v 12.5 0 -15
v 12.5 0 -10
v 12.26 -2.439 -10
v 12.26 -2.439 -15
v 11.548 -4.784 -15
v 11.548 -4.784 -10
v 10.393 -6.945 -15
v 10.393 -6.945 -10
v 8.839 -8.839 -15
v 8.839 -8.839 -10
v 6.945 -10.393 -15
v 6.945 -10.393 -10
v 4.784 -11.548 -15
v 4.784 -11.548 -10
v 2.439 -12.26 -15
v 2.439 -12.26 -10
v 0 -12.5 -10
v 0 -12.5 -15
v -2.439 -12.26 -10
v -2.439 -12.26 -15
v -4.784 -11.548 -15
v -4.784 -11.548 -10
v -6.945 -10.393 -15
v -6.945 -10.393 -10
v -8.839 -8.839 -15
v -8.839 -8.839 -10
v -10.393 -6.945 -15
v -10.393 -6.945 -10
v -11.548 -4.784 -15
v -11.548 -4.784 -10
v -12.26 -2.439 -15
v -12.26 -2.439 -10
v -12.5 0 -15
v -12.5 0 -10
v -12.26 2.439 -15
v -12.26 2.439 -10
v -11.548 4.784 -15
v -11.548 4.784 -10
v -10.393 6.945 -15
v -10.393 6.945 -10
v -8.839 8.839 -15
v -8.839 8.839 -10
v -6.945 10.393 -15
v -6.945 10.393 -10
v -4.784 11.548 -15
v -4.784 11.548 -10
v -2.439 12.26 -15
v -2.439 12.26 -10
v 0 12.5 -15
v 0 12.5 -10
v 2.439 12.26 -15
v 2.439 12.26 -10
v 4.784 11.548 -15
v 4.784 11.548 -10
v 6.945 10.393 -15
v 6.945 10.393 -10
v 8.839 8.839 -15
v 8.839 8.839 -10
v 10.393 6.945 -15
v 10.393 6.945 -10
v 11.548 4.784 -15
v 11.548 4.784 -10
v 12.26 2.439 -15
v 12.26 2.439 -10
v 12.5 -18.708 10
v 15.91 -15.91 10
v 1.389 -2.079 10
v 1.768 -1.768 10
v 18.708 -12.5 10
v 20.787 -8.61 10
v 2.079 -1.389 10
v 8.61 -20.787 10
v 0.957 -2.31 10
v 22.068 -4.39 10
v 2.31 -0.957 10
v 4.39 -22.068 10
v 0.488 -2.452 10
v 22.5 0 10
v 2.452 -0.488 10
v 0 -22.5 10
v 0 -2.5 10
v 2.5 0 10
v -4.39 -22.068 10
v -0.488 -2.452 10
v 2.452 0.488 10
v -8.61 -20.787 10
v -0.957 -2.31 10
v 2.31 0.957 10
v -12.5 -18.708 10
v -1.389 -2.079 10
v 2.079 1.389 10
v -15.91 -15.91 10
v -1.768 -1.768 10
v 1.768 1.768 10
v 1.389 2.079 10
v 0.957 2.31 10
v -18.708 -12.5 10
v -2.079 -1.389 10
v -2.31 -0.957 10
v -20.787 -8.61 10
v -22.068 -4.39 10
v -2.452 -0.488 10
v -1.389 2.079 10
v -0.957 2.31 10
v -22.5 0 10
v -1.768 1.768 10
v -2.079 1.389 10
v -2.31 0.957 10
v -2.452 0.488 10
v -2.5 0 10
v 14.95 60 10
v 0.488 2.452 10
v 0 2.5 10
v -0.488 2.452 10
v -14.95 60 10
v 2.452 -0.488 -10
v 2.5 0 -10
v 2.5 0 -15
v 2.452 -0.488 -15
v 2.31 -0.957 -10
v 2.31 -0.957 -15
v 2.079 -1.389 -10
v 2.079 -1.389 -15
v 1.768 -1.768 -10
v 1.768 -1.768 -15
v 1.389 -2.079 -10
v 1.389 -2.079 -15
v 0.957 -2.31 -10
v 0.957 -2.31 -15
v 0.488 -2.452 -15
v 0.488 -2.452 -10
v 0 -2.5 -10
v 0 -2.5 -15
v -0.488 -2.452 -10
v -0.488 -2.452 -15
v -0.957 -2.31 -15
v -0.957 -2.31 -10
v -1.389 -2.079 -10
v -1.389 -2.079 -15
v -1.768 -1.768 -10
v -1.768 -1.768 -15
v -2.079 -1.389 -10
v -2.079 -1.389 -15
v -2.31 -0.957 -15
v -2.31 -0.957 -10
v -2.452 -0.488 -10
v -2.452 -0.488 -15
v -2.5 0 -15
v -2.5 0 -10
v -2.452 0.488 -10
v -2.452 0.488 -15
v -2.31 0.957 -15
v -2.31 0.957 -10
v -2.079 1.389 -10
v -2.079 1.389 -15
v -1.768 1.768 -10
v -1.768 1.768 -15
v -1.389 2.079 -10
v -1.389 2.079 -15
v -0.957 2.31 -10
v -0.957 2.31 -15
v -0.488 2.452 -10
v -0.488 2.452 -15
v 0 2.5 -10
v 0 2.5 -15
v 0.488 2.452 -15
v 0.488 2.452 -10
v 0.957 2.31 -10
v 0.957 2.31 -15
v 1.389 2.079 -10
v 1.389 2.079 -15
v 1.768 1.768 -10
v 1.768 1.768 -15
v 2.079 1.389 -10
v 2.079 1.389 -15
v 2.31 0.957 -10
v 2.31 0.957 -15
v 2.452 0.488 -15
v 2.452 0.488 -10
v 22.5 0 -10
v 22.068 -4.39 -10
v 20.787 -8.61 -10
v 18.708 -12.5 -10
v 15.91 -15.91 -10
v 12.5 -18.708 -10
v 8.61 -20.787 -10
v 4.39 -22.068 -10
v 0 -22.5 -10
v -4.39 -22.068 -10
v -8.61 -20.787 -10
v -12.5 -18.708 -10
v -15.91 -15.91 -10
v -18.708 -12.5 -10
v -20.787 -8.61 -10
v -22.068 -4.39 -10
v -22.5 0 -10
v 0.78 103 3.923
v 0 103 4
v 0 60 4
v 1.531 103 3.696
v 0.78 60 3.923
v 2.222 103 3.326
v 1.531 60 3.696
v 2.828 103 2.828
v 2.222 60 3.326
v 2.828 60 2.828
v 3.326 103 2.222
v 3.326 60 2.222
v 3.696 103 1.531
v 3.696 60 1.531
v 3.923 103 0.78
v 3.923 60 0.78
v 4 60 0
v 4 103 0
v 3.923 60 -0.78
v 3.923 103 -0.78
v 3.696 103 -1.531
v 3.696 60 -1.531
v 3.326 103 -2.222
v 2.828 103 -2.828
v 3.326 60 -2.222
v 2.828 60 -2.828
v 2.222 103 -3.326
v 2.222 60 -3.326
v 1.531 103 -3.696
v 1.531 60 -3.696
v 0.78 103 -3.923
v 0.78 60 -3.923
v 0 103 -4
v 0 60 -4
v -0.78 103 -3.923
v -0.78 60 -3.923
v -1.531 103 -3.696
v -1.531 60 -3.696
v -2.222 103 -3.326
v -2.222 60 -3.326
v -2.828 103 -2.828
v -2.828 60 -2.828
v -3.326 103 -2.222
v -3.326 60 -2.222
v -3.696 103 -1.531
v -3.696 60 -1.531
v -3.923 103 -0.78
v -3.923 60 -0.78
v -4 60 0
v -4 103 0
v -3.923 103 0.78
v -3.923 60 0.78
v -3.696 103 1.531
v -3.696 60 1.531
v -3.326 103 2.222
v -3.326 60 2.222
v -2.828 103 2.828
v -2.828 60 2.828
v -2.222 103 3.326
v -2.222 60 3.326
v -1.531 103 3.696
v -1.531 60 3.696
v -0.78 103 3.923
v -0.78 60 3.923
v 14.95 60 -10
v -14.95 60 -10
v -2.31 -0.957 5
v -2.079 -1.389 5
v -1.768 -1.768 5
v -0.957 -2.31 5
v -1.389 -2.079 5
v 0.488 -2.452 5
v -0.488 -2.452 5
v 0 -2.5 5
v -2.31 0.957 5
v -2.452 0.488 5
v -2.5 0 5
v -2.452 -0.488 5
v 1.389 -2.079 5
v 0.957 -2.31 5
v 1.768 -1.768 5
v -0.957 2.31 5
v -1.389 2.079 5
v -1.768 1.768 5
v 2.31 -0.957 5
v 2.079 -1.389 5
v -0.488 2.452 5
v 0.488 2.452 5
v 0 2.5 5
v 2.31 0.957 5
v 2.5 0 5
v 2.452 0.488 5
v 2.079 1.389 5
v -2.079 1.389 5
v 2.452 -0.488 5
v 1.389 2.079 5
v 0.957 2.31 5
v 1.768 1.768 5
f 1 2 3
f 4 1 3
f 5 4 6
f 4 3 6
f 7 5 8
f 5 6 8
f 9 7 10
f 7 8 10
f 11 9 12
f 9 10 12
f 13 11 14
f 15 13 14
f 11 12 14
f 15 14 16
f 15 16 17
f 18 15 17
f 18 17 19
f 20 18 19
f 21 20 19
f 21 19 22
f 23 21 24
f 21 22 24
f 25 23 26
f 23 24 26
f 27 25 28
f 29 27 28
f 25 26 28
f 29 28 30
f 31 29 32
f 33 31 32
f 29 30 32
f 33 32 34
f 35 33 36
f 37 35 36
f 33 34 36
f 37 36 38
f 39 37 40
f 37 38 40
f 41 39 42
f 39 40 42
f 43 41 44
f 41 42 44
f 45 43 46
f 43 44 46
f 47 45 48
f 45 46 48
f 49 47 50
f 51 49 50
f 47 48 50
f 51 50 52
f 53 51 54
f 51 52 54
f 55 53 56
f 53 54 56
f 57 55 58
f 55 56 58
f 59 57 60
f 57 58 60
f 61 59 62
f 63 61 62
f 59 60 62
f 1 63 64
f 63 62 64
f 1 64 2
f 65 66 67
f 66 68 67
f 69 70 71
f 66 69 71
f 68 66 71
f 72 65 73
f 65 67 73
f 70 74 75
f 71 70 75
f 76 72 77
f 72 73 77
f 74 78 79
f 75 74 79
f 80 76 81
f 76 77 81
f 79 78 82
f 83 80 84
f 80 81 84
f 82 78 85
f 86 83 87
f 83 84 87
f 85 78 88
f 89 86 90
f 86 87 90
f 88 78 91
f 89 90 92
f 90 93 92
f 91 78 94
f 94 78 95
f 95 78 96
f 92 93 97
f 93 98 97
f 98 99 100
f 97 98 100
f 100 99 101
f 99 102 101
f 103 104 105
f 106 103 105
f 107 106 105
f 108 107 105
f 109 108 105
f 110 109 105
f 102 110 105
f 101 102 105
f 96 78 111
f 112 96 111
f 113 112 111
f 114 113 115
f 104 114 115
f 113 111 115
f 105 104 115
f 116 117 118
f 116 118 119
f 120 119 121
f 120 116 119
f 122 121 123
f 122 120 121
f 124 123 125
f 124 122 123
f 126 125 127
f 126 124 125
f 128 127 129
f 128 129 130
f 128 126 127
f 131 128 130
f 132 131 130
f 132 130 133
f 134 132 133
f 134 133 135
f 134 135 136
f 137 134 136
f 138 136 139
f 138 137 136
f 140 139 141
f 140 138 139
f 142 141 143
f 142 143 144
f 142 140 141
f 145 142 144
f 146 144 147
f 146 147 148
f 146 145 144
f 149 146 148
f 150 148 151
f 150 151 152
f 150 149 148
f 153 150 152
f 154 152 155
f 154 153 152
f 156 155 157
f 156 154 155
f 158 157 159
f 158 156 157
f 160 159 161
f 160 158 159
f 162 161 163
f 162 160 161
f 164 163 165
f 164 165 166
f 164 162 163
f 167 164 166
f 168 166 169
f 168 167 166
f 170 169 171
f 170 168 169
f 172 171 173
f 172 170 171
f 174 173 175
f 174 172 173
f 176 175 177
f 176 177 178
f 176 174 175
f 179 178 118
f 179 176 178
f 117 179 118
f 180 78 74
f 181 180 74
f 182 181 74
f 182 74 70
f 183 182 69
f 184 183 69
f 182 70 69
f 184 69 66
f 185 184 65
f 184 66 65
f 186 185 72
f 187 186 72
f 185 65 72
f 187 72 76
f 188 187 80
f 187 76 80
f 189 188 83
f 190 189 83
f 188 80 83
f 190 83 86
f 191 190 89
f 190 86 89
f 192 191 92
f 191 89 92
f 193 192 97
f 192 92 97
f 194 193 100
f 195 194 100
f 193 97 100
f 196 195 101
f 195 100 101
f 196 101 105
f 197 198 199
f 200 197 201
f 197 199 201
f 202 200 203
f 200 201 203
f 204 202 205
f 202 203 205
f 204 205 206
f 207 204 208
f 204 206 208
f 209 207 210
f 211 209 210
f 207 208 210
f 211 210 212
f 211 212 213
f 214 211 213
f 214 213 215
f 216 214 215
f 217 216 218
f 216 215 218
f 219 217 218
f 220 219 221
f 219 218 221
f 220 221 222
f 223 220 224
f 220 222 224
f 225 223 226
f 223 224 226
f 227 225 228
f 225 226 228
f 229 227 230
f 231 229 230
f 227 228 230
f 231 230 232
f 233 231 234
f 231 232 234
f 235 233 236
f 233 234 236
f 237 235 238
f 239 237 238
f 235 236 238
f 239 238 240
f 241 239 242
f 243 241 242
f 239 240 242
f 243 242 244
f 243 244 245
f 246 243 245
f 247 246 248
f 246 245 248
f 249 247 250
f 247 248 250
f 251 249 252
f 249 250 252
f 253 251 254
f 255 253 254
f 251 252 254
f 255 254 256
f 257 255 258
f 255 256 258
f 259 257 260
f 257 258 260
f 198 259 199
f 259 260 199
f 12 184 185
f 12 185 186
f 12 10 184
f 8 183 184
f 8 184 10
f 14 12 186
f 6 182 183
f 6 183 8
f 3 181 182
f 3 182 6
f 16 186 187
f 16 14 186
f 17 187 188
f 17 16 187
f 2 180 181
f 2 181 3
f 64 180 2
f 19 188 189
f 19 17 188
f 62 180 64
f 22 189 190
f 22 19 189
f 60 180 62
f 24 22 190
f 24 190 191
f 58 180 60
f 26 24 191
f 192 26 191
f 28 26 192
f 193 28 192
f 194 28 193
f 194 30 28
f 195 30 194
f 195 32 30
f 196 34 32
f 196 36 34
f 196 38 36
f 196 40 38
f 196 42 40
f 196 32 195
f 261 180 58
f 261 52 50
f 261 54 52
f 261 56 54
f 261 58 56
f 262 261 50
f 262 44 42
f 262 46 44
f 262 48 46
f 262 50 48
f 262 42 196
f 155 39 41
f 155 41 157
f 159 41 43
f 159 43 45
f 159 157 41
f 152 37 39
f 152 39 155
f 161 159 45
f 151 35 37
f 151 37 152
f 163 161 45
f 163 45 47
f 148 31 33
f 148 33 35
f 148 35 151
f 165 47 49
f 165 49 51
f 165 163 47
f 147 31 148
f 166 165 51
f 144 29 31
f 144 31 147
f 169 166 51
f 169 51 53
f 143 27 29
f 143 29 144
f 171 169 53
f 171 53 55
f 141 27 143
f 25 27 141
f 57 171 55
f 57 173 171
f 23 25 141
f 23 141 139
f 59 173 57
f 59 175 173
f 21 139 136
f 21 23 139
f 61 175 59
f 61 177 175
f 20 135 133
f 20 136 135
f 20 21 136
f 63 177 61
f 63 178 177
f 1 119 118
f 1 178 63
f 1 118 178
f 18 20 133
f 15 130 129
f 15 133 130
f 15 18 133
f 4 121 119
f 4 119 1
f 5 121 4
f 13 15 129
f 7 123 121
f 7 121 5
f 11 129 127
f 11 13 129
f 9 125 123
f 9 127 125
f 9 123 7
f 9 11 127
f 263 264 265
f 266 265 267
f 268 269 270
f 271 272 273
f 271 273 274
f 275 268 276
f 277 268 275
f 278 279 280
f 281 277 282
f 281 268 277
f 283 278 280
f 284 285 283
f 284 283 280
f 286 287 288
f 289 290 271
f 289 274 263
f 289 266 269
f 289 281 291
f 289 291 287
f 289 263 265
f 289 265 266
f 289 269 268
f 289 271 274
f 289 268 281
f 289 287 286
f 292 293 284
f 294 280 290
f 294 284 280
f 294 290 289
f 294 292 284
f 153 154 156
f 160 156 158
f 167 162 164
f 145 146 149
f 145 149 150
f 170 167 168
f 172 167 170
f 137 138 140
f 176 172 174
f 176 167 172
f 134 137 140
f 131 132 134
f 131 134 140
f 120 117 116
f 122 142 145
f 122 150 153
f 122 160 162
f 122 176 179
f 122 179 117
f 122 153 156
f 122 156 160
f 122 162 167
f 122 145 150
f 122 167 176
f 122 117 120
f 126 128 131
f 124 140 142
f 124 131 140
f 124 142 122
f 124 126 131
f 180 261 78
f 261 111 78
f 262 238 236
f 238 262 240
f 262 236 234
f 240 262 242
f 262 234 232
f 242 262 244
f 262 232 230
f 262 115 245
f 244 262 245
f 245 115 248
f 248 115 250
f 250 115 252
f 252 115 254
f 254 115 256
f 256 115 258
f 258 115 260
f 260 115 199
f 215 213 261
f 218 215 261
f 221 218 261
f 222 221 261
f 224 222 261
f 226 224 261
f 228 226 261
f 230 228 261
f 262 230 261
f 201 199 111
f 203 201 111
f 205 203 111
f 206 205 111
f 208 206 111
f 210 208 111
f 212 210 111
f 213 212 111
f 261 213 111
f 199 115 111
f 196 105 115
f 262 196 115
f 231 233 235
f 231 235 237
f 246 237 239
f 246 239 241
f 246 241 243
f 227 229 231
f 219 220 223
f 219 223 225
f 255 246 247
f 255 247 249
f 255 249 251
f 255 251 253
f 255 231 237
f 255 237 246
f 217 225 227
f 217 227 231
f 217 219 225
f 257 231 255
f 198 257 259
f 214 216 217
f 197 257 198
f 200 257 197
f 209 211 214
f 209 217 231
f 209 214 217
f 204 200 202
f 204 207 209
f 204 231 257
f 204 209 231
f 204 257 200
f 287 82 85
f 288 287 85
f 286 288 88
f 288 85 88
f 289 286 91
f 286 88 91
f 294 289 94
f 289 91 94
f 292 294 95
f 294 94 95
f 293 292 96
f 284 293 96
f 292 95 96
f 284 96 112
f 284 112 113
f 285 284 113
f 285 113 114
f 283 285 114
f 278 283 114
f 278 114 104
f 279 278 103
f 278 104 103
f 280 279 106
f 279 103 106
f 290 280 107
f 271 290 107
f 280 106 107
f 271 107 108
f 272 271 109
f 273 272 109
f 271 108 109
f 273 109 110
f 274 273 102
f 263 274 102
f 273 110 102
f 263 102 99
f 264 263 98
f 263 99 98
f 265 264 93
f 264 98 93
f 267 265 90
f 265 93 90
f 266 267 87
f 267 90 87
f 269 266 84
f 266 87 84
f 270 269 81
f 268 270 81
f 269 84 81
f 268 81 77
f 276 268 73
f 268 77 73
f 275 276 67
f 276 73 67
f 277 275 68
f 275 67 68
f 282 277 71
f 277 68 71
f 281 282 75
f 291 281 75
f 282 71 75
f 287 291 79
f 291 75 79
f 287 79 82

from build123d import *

# Parameters (mm, degrees)
BOSS_EXTRUDE1_DEPTH = 10
SKETCH3_R           = 4
BOSS_EXTRUDE2_DEPTH = 43
SKETCH4_R           = 2.5
CUT_EXTRUDE1_DEPTH  = 5
SKETCH6_R           = 12.5
BOSS_EXTRUDE3_DEPTH = 5
CUT_EXTRUDE2_START  = -5
SKETCH7_R           = 2.5
CUT_EXTRUDE2_DEPTH  = 5


with BuildPart() as part:
    # Sketch1 → Boss-Extrude1 (new, symmetric)
    with BuildSketch(Plane.XY):
        with BuildLine():
            Line((-22.5, 0), (-14.95, 60))
            Line((-14.95, 60), (14.95, 60))
            Line((14.95, 60), (22.5, 0))
            ThreePointArc((22.5, 0), (0, -22.5), (-22.5, 0))
        make_face()
    extrude(amount=BOSS_EXTRUDE1_DEPTH, both=True)

    # Sketch3 → Boss-Extrude2 (add)
    with BuildSketch(Plane(origin=(0, 60, 0), x_dir=(1, 0, 0), z_dir=(0, 1, 0))):
        with Locations(Location((0, 0, 0), (0, 0, 270))):
            Circle(SKETCH3_R)
    extrude(amount=BOSS_EXTRUDE2_DEPTH)

    # Sketch4 → Cut-Extrude1 (cut)
    with BuildSketch(Plane.XY.offset(10)):
        Circle(SKETCH4_R)
    extrude(amount=-CUT_EXTRUDE1_DEPTH, mode=Mode.SUBTRACT)

    # Sketch6 → Boss-Extrude3 (add)
    with BuildSketch(Plane(origin=(0, 0, -10), x_dir=(-1, 0, 0), z_dir=(0, 0, -1))):
        with Locations(Location((0, 0, 0), (0, 0, 180))):
            Circle(SKETCH6_R)
    extrude(amount=BOSS_EXTRUDE3_DEPTH)

    # Sketch7 → Cut-Extrude2 (cut)
    with BuildSketch(Plane(origin=(0, 0, -15), x_dir=(-1, 0, 0), z_dir=(0, 0, -1)).offset(CUT_EXTRUDE2_START)):
        with Locations(Location((0, 0, 0), (0, 0, 180))):
            Circle(SKETCH7_R)
    extrude(amount=CUT_EXTRUDE2_DEPTH, mode=Mode.SUBTRACT)


solid = part.part
